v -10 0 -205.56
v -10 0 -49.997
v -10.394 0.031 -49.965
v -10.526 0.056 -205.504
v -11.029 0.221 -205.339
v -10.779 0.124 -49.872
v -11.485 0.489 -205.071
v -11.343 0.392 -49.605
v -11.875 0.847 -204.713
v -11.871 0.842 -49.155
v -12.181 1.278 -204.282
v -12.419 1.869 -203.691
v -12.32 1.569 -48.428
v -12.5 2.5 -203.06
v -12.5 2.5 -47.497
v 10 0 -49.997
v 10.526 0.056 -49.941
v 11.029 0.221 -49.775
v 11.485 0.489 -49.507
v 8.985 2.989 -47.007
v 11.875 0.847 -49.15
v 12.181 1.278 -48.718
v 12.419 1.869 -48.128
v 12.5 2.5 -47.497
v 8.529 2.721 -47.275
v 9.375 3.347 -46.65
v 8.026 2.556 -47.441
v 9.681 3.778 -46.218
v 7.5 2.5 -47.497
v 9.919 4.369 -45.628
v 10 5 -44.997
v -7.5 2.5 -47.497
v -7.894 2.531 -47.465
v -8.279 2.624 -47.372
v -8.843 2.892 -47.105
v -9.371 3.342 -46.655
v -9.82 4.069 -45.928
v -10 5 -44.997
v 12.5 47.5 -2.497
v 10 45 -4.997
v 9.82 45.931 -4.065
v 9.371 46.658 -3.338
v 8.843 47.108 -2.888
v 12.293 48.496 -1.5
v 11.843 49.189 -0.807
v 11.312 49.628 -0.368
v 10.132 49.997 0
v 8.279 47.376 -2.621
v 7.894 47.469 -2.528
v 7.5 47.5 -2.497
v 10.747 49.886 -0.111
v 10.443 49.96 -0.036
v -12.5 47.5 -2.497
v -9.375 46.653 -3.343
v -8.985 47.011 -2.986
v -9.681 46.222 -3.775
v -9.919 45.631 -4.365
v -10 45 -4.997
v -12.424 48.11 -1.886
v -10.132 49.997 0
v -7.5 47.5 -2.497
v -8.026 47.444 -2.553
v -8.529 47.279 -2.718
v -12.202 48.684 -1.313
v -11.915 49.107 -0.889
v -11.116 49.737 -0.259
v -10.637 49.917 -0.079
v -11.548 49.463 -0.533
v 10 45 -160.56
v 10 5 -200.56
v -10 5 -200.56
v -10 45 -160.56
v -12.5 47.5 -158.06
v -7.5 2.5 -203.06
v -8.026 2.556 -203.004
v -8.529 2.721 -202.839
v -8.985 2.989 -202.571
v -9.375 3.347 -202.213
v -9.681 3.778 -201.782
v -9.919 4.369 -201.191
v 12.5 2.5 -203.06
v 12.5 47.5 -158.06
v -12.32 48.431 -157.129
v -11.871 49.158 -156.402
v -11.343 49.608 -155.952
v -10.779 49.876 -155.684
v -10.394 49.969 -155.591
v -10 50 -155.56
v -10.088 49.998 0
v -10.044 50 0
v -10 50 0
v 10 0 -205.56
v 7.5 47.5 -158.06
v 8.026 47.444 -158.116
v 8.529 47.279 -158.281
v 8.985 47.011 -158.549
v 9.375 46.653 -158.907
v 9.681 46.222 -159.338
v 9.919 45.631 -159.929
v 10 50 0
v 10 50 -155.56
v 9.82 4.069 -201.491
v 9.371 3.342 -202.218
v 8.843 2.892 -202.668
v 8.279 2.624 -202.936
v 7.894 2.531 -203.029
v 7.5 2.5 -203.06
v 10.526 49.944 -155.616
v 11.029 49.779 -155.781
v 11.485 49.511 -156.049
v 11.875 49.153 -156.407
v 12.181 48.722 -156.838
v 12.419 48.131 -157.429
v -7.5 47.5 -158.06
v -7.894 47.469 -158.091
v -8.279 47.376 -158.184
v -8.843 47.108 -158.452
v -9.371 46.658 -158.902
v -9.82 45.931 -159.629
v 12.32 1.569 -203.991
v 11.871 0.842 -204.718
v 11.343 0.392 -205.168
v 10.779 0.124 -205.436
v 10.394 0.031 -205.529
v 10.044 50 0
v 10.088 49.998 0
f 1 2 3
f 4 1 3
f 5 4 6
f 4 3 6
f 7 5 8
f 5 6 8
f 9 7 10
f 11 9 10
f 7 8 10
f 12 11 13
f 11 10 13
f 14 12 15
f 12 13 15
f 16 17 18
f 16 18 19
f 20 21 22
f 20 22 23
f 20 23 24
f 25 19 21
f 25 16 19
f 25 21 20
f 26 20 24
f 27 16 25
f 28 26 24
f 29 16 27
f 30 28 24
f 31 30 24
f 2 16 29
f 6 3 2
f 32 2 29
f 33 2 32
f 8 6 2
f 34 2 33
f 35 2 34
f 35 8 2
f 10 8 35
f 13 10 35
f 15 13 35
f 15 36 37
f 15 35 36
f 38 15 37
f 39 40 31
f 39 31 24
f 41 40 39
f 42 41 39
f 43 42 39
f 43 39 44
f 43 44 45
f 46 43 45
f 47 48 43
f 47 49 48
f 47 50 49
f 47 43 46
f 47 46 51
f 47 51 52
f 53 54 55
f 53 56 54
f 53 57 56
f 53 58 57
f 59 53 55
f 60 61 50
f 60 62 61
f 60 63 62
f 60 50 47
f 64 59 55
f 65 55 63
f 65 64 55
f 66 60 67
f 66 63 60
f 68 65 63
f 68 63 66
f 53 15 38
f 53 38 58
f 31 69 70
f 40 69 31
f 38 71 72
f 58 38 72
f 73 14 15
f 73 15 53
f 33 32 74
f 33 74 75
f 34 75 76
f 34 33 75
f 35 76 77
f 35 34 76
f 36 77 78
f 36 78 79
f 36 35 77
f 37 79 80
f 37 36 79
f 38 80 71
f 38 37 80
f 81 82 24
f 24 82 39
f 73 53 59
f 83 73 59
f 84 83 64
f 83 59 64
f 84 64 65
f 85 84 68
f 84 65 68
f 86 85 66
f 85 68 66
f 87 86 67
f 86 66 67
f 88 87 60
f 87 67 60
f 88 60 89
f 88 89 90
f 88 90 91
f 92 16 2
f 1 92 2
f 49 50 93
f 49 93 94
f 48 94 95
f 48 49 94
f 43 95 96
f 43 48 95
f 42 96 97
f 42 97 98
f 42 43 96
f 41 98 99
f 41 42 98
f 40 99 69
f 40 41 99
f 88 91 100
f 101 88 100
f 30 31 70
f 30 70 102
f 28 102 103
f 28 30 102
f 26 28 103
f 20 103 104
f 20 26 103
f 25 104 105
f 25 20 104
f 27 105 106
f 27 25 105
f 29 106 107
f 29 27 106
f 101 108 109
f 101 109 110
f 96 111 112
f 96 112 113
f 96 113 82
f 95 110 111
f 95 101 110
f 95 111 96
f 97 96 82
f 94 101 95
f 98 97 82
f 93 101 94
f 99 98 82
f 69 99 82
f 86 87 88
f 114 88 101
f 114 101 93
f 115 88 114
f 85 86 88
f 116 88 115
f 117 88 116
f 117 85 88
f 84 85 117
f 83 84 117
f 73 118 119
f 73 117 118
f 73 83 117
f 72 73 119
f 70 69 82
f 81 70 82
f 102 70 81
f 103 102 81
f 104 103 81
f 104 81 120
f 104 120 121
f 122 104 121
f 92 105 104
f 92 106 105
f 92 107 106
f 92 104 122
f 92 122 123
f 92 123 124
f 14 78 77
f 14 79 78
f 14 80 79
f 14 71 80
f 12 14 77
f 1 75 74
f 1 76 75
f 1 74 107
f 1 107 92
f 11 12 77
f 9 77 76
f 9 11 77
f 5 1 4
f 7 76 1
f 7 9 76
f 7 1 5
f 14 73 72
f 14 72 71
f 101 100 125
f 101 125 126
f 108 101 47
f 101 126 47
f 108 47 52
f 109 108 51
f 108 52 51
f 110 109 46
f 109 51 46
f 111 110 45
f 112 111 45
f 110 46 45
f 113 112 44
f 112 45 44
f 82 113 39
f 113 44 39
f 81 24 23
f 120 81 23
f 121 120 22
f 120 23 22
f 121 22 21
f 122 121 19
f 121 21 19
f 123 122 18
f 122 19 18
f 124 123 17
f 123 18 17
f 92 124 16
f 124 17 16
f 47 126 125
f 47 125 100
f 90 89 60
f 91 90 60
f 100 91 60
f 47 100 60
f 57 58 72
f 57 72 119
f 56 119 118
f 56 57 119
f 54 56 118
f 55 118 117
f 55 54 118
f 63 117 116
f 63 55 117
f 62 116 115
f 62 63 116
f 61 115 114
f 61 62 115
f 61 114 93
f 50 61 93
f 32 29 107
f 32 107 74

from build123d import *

# Parameters (mm, degrees)
EXTRUDE_1_DEPTH     = 205.56
CUT_EXTRUDE_1_DEPTH = 50


with BuildPart() as part:
    # Эскиз1 → Бобышка-Вытянуть1 (new body)
    with BuildSketch(Plane.XY):
        with BuildLine():
            Line((-10, 50), (10, 50))
            ThreePointArc((10, 50), (11.767766953, 49.267766953), (12.5, 47.5))
            Line((12.5, 47.5), (12.5, 2.5))
            ThreePointArc((12.5, 2.5), (11.767766953, 0.732233047), (10, 0))
            Line((10, 0), (-10, 0))
            ThreePointArc((-10, 0), (-11.767766953, 0.732233047), (-12.5, 2.5))
            Line((-12.5, 2.5), (-12.5, 47.5))
            ThreePointArc((-12.5, 47.5), (-11.767766953, 49.267766953), (-10, 50))
        make_face()
        with BuildLine():
            Line((-7.5, 47.5), (7.5, 47.5))
            ThreePointArc((7.5, 47.5), (9.267766953, 46.767766953), (10, 45))
            Line((10, 45), (10, 5))
            ThreePointArc((10, 5), (9.267766953, 3.232233047), (7.5, 2.5))
            Line((7.5, 2.5), (-7.5, 2.5))
            ThreePointArc((-7.5, 2.5), (-9.267766953, 3.232233047), (-10, 5))
            Line((-10, 5), (-10, 45))
            ThreePointArc((-10, 45), (-9.267766953, 46.767766953), (-7.5, 47.5))
        make_face(mode=Mode.SUBTRACT)
    extrude(amount=-EXTRUDE_1_DEPTH)

    # Эскиз2 → Вырез-Вытянуть1 (cut)
    with BuildSketch(Plane.ZY.offset(12.5)):
        Polygon((-205.56, 50), (-155.559999999, 50), (-205.56, 0), align=None)
        Polygon((0.003491861, 0), (-49.996508139, 0), (0.003491861, 49.999999999), align=None)
    extrude(amount=-CUT_EXTRUDE_1_DEPTH, mode=Mode.SUBTRACT)


solid = part.part
